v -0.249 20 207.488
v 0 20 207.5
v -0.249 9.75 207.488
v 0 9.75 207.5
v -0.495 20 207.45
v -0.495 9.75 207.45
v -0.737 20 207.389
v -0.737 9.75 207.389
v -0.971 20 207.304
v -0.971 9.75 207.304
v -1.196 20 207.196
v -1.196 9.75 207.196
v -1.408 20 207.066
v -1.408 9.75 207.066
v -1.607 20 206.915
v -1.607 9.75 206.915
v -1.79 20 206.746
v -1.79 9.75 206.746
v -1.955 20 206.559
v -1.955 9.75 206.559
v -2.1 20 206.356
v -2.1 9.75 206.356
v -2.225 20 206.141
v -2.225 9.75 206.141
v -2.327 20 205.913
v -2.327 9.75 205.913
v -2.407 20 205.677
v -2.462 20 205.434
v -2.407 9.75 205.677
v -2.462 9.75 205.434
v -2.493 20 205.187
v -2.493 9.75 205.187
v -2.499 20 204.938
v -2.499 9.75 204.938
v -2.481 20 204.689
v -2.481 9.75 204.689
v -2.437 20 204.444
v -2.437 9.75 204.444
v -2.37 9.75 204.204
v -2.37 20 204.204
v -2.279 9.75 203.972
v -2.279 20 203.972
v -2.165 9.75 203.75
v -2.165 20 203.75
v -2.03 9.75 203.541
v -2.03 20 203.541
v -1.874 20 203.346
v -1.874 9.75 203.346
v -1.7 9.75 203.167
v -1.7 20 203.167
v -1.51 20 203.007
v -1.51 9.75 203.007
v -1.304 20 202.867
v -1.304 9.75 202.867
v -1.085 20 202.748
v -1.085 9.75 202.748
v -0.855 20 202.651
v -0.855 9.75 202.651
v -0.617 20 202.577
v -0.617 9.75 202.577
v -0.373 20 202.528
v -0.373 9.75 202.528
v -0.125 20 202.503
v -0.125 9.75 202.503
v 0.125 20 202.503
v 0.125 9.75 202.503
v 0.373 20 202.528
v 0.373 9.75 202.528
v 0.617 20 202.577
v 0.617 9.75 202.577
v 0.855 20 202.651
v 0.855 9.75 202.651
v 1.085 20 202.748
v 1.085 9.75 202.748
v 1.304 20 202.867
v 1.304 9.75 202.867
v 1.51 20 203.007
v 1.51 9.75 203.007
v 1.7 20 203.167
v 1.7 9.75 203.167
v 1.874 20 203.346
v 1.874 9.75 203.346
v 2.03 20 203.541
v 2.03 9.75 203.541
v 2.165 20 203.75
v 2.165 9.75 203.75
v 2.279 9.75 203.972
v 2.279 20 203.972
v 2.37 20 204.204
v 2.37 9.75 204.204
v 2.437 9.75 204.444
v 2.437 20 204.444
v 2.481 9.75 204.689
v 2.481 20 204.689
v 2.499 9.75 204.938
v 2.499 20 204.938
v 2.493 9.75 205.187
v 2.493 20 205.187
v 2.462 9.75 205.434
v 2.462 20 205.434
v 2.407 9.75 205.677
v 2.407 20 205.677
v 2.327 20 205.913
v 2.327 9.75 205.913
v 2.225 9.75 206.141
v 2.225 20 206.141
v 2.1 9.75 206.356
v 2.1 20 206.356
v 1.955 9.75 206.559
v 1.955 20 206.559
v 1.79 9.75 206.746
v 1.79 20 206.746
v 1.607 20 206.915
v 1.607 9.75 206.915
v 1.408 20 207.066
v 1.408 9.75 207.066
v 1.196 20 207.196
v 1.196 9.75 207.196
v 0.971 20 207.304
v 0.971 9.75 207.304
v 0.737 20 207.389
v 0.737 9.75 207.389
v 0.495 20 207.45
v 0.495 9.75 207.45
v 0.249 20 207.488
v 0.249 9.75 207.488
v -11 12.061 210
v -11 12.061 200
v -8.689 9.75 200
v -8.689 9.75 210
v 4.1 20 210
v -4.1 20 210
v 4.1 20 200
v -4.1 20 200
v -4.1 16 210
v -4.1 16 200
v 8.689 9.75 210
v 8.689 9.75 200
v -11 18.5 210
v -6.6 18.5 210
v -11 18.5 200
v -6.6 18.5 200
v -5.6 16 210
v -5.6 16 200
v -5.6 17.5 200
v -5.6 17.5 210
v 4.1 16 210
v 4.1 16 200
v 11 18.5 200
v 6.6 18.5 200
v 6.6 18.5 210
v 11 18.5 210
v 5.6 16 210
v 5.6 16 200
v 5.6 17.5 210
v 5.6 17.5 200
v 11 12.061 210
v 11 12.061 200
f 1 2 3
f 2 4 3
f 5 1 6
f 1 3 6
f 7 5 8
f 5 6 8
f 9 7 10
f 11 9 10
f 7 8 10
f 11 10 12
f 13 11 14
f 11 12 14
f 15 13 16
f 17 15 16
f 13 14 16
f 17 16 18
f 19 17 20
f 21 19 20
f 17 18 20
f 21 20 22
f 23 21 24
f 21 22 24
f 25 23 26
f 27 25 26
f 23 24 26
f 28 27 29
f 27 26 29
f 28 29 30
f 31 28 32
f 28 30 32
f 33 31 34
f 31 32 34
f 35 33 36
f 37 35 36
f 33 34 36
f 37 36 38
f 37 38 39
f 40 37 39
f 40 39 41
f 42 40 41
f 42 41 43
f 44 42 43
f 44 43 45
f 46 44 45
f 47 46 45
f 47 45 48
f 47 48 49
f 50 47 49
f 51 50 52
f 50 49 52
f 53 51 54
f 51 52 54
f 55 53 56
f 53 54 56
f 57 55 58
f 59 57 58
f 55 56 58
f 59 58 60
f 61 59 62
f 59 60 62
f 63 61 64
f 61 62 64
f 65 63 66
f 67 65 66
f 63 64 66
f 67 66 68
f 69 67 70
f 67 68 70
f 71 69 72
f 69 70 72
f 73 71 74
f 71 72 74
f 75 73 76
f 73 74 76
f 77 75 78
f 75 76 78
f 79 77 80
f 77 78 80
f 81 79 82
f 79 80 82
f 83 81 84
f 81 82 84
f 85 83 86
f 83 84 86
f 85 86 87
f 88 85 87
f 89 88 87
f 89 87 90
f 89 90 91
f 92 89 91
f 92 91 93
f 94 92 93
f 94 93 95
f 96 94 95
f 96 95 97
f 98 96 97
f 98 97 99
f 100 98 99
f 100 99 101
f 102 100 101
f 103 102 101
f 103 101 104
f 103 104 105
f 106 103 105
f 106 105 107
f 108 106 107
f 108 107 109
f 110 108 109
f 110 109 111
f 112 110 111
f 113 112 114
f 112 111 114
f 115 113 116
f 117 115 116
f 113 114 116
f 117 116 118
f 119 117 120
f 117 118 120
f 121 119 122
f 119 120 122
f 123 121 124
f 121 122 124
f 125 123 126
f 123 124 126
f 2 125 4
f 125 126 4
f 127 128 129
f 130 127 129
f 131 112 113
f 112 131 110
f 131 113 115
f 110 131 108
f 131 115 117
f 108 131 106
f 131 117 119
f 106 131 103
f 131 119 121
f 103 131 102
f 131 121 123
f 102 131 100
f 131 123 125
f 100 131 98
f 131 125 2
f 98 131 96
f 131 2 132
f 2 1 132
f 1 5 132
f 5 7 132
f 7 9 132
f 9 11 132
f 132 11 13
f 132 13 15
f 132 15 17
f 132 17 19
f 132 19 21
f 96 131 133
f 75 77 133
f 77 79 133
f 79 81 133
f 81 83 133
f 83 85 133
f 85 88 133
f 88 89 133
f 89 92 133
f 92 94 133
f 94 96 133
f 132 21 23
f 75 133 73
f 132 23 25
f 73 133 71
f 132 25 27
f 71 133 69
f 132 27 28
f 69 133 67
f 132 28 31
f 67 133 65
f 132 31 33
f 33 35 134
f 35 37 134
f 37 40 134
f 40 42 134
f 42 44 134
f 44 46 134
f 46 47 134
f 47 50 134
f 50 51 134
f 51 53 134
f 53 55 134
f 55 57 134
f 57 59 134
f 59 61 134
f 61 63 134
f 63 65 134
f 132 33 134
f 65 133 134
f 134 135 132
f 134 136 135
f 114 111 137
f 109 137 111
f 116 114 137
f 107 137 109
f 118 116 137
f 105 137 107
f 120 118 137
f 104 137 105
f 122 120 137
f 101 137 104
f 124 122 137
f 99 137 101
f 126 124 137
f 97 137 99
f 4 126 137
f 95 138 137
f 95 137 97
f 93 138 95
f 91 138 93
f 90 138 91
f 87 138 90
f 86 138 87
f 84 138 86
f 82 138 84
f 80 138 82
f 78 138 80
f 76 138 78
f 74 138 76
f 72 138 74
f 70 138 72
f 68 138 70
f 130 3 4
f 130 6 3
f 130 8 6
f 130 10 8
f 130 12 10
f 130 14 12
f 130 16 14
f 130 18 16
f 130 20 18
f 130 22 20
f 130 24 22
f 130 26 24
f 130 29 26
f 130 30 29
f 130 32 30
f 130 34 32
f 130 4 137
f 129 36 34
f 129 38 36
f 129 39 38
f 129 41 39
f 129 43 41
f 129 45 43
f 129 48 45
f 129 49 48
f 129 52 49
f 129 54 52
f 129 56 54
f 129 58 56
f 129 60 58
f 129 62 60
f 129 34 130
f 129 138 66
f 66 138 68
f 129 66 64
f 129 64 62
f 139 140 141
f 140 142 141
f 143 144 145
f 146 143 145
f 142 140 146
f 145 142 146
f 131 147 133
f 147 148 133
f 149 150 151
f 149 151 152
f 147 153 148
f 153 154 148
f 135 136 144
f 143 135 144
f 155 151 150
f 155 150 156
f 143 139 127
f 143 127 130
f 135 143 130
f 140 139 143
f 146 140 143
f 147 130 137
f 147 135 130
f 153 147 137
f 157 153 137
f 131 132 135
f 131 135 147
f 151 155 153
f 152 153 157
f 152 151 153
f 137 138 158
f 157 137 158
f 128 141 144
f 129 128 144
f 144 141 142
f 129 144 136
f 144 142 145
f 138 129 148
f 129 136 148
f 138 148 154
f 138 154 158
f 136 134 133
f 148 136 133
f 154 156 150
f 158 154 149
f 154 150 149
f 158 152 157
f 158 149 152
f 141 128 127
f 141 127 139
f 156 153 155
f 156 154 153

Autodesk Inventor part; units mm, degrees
ref_plane "YZ Plane" through (0, 0, 0) normal (1, 0, 0) x (0, 1, 0)
ref_plane "XZ Plane" through (0, 0, 0) normal (0, 1, 0) x (-1, 0, 0)
ref_plane "XY Plane" through (0, 0, 0) normal (0, 0, 1) x (1, 0, 0)
ref_plane "Plano de trabalho2" through (-4.1, 8.25, 200) normal (0, 0, 1) x (1, 0, 0)
sketch "Esboço2" plane through (-4.1, 8.25, 200) normal (0, 0, 1) x (1, 0, 0)
  line L0 (-6.9, 3.8107) -> (-6.9, 10.25) projected
  line L1 (-6.9, 10.25) -> (-6.9, 3.8107)
  line L2 (12.7893, 1.5) -> (-4.5893, 1.5) projected
  line L3 (-6.9, 3.8107) -> (-4.5893, 1.5)
  line L4 (-4.5893, 1.5) -> (12.7893, 1.5)
  line L5 (12.7893, 1.5) -> (15.1, 3.8107)
  line L6 (15.1, 10.25) -> (15.1, 3.8107) projected
  line L7 (15.1, 3.8107) -> (15.1, 10.25)
  line L8 (10.7, 10.25) -> (15.1, 10.25) projected
  line L9 (15.1, 10.25) -> (10.7, 10.25)
  line L10 (9.7, 7.75) -> (9.7, 9.25) projected
  line L11 (10.7, 10.25) -> (9.7, 9.25)
  line L12 (9.7, 9.25) -> (9.7, 7.75)
  line L13 (9.7, 7.75) -> (8.2, 7.75)
  line L14 (15.1, 11.75) -> (8.2, 11.75) projected
  line L15 (8.2, 7.75) -> (8.2, 11.75)
  line L16 (0, 7.75) -> (0, 11.75) projected
  line L17 (8.2, 11.75) -> (0, 11.75)
  line L18 (0, 11.75) -> (0, 7.75)
  line L19 (0, 7.75) -> (-1.5, 7.75)
  line L20 (-2.5, 10.25) -> (-1.5, 9.25) projected
  line L21 (-1.5, 7.75) -> (-1.5, 9.25)
  line L22 (-1.5, 9.25) -> (-2.5, 10.25)
  line L23 (-2.5, 10.25) -> (-6.9, 10.25)
  point P0 (4.1, -8.25)
extrude "Extrusão1" add sketch "Esboço2" along normal blind 10
ref_plane "Plano de trabalho5" through (-4.1, 20, 200) normal (0, 1, 0) x (1, 0, 0)
sketch "Esboço3" plane through (-4.1, 20, 200) normal (0, 1, 0) x (1, 0, 0)
  circle A0 centre (4.1, -5) radius 2.5
  line L0 (19.5, 0) -> (-11.3, 0) projected
  line L1 (15.1, 0) -> (15.1, -10) projected
  point P0 (4.1, 200)
  dimension "d2" = 5
  dimension "d3" = 5
  dimension "d4" = 11
hole "Furo1" at (0, 20, 205) direction (0, -1, 0) diameter 5 depth 20 tip angle 118
properties part number "Pecinha do perfil_CPY" material "Alumínio"
